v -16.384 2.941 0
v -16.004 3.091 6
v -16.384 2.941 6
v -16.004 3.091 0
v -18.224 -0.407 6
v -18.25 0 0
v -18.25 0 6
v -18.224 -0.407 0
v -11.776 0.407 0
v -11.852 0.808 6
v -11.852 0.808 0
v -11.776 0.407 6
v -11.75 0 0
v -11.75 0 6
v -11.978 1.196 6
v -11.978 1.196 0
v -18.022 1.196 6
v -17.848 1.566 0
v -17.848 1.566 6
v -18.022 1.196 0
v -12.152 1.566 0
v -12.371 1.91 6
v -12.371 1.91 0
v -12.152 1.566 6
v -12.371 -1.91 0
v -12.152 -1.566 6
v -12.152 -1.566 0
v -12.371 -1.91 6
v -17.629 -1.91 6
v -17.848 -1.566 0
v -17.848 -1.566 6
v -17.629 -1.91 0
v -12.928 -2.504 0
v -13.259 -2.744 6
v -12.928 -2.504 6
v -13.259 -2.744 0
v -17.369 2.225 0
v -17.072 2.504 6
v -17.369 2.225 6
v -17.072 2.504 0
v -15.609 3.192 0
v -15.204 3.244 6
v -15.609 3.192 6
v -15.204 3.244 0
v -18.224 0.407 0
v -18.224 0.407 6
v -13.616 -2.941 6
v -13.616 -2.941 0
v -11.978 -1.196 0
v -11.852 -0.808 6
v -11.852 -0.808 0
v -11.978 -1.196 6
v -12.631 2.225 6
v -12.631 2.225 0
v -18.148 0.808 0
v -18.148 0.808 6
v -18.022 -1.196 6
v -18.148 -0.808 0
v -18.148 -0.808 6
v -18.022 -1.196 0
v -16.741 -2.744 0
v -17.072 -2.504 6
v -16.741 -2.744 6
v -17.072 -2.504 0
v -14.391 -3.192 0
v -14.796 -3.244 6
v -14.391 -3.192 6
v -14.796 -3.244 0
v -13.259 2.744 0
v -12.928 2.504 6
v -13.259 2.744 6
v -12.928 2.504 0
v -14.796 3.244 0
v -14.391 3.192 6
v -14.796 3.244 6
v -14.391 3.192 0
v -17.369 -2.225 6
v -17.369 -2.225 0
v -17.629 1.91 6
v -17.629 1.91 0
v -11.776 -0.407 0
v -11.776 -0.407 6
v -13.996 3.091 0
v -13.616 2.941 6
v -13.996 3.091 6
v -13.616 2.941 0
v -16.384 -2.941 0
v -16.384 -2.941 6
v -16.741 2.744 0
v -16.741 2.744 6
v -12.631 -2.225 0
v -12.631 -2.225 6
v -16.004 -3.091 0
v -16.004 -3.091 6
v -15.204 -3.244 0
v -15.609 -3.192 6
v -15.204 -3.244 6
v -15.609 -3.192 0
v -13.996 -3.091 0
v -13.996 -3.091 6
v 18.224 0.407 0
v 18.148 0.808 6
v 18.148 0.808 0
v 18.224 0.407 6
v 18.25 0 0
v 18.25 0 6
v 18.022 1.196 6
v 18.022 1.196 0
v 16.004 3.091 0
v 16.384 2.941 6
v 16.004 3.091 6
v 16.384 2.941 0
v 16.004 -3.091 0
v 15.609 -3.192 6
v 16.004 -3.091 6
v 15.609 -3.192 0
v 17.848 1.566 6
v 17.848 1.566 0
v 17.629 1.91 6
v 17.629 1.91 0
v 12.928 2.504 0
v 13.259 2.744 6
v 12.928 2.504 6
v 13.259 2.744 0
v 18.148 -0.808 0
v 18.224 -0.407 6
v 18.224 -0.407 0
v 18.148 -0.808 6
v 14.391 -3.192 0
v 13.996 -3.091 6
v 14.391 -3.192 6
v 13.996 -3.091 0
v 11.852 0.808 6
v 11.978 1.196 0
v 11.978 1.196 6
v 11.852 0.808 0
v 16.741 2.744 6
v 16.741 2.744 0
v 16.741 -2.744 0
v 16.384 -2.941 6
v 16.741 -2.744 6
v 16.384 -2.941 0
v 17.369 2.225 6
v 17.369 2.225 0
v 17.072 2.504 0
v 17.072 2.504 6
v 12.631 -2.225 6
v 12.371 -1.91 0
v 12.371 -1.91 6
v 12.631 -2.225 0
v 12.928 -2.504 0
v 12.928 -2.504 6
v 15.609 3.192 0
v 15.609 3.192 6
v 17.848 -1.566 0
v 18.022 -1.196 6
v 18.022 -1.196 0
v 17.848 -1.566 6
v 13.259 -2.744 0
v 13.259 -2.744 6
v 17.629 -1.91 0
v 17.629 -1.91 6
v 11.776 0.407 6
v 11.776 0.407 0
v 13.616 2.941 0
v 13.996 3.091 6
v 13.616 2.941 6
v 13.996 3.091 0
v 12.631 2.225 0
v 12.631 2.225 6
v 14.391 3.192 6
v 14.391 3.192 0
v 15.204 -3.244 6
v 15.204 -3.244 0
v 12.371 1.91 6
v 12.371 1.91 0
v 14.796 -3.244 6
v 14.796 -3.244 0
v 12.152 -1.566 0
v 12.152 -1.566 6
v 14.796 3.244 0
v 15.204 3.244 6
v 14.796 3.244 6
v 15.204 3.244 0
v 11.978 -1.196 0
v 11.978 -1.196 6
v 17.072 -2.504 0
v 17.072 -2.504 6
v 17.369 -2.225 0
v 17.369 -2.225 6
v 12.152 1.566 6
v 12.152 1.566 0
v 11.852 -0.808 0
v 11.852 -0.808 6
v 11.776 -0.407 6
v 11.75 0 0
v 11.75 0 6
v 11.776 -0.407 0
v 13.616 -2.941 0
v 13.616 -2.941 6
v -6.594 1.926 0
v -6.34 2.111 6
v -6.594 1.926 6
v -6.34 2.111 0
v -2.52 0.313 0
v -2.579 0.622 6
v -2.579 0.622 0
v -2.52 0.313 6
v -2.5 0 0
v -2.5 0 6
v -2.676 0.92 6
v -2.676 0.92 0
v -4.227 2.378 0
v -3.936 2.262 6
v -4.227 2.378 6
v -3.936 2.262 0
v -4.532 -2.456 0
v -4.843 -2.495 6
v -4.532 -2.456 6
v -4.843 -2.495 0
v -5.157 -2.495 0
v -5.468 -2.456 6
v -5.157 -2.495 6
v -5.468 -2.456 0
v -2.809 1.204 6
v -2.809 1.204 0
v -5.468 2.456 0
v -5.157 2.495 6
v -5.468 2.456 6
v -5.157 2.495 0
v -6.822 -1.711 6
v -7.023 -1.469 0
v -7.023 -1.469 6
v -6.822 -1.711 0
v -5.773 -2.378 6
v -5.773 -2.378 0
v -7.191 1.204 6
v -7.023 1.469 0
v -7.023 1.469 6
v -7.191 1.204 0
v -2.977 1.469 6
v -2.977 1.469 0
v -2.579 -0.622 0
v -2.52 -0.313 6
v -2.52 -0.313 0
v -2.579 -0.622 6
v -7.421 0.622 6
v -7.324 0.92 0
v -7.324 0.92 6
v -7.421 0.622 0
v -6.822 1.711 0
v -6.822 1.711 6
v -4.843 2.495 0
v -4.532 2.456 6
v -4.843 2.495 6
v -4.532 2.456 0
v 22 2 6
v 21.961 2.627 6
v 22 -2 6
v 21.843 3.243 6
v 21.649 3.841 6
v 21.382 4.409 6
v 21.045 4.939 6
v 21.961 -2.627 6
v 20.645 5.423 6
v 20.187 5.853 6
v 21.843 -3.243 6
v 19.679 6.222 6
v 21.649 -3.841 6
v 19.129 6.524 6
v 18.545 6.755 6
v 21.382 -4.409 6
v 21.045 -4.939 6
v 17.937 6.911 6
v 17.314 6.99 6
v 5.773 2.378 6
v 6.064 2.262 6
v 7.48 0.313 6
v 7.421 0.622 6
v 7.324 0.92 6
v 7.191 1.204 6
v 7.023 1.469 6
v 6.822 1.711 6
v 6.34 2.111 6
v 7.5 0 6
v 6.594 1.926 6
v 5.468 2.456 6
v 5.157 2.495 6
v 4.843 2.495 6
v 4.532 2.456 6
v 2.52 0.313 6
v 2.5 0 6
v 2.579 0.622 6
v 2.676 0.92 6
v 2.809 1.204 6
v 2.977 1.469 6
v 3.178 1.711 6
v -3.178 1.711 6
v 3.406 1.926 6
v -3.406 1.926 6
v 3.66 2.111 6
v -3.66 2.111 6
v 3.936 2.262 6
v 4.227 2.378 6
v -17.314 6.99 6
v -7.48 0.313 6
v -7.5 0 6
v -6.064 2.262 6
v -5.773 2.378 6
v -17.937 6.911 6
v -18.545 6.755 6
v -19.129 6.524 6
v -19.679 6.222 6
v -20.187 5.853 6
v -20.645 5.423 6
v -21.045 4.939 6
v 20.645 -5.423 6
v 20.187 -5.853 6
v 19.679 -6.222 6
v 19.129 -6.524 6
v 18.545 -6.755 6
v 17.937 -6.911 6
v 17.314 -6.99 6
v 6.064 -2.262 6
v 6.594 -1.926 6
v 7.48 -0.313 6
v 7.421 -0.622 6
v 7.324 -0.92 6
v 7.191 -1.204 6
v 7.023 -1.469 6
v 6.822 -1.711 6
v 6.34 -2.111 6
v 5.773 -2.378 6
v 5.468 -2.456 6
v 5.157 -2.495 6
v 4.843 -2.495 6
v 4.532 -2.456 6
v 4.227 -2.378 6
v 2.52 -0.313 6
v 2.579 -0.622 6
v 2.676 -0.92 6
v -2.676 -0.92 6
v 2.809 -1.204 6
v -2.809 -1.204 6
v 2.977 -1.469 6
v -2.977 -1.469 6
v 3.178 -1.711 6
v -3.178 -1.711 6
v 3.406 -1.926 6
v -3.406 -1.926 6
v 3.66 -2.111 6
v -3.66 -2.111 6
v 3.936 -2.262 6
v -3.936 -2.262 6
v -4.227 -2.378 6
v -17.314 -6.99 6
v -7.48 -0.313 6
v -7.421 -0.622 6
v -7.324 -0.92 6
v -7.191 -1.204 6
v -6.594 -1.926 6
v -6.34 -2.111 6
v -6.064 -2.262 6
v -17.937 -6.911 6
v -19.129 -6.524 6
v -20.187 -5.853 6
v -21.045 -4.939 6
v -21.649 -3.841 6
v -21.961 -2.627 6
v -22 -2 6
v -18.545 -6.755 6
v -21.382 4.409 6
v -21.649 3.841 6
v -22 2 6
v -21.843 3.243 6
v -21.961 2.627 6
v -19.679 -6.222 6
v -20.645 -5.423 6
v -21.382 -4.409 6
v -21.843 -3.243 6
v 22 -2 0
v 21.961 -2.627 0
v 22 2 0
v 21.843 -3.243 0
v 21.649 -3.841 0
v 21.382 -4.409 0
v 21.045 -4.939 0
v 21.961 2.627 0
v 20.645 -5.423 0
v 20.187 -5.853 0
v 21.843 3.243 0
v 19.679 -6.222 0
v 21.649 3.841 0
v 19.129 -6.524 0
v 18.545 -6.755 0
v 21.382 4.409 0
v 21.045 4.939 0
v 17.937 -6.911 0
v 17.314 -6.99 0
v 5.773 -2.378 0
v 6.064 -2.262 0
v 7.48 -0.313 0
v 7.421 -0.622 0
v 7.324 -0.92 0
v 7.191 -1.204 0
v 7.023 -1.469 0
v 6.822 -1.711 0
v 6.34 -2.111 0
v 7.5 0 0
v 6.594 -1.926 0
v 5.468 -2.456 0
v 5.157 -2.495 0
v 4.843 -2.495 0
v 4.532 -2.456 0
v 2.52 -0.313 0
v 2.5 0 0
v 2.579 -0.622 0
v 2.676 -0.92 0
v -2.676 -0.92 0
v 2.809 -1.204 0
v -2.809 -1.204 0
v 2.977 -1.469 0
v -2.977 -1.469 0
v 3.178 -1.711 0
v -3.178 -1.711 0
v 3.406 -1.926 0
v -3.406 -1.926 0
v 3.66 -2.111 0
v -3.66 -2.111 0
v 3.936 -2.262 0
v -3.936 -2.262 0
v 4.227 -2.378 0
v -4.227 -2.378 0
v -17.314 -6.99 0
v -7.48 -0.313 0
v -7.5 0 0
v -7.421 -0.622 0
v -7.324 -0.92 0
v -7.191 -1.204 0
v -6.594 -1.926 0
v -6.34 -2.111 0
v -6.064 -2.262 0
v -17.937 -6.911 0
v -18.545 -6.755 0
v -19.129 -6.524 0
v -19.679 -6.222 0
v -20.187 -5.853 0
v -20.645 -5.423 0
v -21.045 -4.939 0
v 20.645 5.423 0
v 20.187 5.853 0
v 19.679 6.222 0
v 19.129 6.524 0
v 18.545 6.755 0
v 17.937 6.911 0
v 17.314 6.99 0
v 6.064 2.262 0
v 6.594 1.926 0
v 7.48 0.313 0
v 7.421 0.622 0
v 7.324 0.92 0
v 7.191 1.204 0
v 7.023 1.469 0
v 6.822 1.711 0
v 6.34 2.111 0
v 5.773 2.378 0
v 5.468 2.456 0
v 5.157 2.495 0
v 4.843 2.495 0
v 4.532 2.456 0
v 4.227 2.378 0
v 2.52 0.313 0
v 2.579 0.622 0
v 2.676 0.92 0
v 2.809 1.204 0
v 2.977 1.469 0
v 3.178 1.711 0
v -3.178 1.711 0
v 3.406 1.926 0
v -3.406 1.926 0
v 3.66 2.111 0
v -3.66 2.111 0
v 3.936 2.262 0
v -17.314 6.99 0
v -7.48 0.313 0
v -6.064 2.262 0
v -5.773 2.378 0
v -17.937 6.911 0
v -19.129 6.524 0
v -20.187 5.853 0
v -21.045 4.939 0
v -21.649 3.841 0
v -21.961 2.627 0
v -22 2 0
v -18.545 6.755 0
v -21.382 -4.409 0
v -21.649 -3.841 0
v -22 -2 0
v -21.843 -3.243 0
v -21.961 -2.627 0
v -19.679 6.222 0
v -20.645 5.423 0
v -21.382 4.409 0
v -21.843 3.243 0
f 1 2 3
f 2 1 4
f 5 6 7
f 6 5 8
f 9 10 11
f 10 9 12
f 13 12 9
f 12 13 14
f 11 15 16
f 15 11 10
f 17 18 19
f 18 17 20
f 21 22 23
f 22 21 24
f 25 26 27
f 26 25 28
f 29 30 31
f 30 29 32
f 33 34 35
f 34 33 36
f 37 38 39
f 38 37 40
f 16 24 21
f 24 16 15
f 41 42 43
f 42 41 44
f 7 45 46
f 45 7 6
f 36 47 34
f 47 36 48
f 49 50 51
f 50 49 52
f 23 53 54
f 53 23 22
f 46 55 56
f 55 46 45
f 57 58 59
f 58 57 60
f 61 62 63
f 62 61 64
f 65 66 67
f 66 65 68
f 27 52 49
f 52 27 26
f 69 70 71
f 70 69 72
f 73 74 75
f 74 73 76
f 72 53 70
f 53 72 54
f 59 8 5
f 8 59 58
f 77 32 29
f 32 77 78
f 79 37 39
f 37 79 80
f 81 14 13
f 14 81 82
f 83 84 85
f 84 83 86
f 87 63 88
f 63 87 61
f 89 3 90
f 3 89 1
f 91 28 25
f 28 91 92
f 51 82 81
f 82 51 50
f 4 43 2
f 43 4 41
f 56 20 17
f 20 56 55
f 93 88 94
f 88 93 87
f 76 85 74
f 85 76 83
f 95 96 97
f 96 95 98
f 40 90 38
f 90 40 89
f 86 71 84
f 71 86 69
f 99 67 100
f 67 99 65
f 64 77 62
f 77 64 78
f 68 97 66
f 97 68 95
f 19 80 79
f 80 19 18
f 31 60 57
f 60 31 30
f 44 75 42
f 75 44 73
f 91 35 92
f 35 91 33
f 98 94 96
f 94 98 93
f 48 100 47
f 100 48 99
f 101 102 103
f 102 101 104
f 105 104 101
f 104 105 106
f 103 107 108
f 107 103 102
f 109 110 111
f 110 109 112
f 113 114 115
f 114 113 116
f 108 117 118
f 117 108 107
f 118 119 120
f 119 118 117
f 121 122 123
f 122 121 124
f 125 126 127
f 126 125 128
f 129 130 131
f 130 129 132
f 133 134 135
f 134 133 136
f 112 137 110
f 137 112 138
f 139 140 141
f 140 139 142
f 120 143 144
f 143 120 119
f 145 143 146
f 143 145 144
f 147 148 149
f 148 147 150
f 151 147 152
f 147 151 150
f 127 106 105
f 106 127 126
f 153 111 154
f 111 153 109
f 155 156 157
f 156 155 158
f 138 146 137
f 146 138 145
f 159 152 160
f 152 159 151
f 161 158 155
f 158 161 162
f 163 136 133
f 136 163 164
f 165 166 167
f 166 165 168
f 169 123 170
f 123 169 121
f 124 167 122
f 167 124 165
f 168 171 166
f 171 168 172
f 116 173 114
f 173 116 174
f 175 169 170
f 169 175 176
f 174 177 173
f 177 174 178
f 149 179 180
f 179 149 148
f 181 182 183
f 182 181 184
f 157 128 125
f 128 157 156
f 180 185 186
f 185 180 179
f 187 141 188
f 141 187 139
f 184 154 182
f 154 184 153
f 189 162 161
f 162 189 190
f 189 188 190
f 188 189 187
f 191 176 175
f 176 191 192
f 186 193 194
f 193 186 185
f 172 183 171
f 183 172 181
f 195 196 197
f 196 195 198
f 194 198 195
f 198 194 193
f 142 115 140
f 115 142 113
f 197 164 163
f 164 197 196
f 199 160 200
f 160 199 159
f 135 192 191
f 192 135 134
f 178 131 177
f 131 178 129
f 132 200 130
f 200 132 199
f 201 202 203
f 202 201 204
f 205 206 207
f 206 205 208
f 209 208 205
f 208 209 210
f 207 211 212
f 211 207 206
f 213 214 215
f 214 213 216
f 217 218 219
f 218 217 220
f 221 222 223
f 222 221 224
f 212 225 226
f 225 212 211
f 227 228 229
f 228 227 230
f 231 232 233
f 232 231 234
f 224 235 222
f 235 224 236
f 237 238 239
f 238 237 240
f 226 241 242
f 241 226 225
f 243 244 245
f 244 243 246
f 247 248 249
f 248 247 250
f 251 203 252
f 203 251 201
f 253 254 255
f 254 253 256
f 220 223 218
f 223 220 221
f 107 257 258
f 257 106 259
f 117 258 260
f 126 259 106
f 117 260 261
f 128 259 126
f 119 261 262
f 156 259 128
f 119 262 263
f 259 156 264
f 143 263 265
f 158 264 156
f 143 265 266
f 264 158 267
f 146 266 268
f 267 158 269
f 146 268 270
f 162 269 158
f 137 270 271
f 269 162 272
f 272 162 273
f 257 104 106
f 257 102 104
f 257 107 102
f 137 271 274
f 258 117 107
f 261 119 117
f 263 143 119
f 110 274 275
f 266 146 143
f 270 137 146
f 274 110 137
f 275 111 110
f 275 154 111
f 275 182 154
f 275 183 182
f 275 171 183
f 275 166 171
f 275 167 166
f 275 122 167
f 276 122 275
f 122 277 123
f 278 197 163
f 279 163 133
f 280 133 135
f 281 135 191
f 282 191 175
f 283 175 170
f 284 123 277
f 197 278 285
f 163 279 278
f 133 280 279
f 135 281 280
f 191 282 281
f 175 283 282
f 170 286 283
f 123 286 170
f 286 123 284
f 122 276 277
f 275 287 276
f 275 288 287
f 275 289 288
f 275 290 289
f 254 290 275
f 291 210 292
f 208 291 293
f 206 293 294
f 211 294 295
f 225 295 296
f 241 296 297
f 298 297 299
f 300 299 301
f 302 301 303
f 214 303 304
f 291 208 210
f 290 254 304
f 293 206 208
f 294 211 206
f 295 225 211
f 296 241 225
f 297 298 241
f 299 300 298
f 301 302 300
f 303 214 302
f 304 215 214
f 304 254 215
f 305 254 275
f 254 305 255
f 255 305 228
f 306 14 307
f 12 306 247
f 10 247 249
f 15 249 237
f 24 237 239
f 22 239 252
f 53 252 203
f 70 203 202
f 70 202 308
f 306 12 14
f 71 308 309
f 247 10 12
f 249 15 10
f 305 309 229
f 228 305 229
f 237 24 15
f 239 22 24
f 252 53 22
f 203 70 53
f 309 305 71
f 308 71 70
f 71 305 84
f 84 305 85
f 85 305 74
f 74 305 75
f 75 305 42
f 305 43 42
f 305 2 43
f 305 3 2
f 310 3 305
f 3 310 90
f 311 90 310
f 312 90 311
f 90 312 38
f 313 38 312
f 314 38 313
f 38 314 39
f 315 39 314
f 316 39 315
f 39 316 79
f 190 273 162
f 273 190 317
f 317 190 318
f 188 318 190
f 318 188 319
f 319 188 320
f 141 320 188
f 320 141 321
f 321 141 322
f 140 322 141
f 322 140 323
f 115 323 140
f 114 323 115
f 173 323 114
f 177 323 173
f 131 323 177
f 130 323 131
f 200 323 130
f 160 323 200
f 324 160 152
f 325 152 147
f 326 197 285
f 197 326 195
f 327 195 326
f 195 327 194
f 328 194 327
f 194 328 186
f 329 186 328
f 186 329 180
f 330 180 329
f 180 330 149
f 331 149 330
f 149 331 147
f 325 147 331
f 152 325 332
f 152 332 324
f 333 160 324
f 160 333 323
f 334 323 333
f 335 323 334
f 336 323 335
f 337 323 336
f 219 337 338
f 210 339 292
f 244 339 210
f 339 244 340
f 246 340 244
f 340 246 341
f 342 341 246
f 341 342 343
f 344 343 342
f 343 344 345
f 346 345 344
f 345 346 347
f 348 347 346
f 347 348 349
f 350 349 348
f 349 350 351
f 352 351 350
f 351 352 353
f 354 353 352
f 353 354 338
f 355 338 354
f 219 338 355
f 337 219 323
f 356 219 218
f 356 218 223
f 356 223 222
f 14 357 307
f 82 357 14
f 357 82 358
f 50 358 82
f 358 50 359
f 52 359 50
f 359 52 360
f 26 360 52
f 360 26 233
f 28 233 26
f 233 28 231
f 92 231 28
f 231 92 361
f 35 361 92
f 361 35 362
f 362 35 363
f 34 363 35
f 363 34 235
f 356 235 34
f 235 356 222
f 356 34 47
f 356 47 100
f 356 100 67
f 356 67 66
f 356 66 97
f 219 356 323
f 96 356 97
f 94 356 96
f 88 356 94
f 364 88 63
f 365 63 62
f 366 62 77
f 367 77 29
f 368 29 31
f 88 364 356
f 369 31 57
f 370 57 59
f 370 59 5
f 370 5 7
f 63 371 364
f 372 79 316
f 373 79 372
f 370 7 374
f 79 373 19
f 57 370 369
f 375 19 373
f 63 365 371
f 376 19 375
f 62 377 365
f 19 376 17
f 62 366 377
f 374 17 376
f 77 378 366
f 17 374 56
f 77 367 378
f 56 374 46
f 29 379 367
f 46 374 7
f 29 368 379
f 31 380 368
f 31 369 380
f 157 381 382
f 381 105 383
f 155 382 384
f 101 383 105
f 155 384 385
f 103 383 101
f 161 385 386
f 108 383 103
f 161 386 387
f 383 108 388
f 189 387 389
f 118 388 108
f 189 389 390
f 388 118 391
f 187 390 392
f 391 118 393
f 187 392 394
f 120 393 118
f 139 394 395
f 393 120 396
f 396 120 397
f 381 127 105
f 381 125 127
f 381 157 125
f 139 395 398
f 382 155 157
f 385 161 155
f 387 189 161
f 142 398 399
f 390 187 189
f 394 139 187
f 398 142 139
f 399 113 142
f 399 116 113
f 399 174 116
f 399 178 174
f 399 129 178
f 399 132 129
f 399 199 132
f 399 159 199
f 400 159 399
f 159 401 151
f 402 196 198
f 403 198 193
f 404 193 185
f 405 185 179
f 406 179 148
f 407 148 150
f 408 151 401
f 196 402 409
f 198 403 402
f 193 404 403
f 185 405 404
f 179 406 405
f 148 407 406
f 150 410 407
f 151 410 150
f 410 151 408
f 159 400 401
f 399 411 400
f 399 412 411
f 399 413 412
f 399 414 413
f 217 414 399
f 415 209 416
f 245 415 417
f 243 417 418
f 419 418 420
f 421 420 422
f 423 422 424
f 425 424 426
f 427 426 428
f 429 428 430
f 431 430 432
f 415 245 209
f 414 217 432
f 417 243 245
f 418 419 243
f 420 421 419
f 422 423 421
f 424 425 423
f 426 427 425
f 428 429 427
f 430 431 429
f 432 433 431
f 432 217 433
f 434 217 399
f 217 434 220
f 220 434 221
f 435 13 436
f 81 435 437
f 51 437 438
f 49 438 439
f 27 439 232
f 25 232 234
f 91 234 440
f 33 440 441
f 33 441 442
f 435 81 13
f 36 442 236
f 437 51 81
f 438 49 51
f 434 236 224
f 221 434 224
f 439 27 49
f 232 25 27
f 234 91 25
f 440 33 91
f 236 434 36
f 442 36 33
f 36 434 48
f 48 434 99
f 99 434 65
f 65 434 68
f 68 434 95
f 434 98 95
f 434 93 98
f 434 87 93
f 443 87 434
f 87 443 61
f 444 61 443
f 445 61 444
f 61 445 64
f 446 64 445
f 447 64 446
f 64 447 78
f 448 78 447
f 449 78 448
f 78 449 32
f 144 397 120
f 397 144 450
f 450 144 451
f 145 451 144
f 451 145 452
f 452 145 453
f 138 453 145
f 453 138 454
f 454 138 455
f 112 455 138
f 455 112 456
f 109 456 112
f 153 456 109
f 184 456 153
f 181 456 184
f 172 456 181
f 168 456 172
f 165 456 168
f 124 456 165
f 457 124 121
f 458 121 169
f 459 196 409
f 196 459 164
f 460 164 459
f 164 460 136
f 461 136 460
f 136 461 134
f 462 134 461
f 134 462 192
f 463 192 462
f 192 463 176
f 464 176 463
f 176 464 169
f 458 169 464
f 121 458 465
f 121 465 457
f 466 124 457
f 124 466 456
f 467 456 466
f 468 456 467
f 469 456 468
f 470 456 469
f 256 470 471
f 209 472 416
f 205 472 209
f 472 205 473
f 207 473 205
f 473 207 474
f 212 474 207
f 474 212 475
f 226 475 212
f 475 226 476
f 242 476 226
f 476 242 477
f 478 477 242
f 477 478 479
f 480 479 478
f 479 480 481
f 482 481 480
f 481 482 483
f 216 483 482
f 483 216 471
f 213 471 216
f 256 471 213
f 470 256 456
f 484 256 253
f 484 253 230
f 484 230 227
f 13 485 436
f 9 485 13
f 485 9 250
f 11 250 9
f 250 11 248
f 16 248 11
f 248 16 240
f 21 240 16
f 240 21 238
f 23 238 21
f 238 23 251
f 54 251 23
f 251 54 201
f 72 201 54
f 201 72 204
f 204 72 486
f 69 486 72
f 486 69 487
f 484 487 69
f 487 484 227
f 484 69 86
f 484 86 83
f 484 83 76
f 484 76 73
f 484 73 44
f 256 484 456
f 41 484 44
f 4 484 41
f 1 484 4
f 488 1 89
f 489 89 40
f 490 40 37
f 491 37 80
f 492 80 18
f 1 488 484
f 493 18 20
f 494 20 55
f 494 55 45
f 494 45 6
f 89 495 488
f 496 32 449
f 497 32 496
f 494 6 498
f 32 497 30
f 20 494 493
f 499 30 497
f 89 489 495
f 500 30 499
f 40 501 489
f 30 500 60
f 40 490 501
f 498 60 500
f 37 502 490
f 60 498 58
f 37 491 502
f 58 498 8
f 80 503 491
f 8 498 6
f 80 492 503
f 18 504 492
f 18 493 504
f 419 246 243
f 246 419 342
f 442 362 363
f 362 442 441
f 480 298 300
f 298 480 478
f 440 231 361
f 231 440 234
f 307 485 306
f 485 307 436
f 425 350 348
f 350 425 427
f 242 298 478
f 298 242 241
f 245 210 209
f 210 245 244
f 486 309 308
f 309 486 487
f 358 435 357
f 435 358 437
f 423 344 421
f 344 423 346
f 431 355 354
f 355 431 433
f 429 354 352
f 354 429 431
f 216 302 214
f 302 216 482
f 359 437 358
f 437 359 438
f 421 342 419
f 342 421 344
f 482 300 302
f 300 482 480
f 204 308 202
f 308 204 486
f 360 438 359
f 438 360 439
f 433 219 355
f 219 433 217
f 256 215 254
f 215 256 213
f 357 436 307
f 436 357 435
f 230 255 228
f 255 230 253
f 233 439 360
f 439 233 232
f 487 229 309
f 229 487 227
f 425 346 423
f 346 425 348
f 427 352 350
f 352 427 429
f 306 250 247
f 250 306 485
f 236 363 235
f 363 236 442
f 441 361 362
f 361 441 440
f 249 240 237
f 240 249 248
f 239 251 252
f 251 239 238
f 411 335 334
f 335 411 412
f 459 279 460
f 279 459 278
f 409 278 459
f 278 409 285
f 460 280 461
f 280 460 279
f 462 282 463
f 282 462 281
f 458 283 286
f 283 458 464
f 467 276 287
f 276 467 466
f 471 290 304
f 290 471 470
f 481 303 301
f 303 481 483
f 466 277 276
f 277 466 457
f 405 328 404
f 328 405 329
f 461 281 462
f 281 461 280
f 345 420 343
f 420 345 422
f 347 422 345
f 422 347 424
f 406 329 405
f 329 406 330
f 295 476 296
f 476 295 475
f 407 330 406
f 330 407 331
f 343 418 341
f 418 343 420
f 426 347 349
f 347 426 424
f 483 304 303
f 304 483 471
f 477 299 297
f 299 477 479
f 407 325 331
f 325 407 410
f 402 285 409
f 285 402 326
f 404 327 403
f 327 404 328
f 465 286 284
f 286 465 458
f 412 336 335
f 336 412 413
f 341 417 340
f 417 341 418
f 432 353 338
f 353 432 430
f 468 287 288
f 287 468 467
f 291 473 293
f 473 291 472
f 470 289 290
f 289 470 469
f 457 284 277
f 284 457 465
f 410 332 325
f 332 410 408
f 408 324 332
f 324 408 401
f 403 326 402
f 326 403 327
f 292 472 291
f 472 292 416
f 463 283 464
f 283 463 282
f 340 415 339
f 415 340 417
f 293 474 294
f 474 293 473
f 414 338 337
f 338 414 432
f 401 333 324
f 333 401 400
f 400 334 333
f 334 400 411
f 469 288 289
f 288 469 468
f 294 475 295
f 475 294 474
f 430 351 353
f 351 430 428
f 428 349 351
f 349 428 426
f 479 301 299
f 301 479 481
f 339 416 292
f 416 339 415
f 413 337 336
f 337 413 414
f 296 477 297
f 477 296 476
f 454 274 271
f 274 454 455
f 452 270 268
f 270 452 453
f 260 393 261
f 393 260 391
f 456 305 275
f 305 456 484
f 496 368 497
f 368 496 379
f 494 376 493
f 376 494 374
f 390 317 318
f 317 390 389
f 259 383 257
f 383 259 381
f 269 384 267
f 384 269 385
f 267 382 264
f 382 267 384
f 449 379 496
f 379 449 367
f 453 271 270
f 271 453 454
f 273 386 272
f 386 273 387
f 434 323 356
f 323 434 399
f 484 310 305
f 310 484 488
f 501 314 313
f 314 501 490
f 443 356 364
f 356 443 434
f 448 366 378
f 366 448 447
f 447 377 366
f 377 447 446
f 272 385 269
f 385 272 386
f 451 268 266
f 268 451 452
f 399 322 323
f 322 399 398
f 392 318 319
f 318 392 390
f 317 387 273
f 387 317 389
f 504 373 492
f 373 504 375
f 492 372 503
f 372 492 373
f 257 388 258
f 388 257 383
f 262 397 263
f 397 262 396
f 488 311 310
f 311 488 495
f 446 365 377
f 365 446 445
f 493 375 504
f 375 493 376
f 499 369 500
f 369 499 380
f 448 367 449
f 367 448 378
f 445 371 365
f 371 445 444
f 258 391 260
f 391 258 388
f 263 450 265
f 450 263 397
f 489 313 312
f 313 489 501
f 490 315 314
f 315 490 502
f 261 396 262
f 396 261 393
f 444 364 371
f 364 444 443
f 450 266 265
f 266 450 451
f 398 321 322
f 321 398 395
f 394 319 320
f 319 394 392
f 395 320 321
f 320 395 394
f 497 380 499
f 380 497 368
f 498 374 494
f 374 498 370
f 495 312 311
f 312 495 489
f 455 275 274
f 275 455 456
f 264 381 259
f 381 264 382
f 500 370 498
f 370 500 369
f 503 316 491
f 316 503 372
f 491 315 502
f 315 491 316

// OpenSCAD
$fn = 50;


difference() {
	union() {
		hull() {
			translate(v = [-17.0000000000, 2.0000000000, 0]) {
				cylinder(h = 6, r = 5);
			}
			translate(v = [17.0000000000, 2.0000000000, 0]) {
				cylinder(h = 6, r = 5);
			}
			translate(v = [-17.0000000000, -2.0000000000, 0]) {
				cylinder(h = 6, r = 5);
			}
			translate(v = [17.0000000000, -2.0000000000, 0]) {
				cylinder(h = 6, r = 5);
			}
		}
	}
	union() {
		#translate(v = [-15.0000000000, 0.0000000000, 0]) {
			cylinder(h = 6, r = 3.2500000000);
		}
		#translate(v = [15.0000000000, 0.0000000000, 0]) {
			cylinder(h = 6, r = 3.2500000000);
		}
		#translate(v = [-15.0000000000, 0.0000000000, -100.0000000000]) {
			cylinder(h = 200, r = 3.2500000000);
		}
		#translate(v = [-15.0000000000, 0.0000000000, -100.0000000000]) {
			cylinder(h = 200, r = 3.2500000000);
		}
		#translate(v = [15.0000000000, 0.0000000000, -100.0000000000]) {
			cylinder(h = 200, r = 3.2500000000);
		}
		#translate(v = [15.0000000000, 0.0000000000, -100.0000000000]) {
			cylinder(h = 200, r = 3.2500000000);
		}
		#translate(v = [-15.0000000000, 0.0000000000, 0]) {
			cylinder(h = 6, r = 1.8000000000);
		}
		#translate(v = [15.0000000000, 0.0000000000, 0]) {
			cylinder(h = 6, r = 1.8000000000);
		}
		#translate(v = [-15.0000000000, 0.0000000000, 0]) {
			cylinder(h = 6, r = 1.8000000000);
		}
		#translate(v = [15.0000000000, 0.0000000000, 0]) {
			cylinder(h = 6, r = 1.8000000000);
		}
		#translate(v = [-15.0000000000, 0.0000000000, 0]) {
			cylinder(h = 6, r = 1.8000000000);
		}
		#translate(v = [15.0000000000, 0.0000000000, 0]) {
			cylinder(h = 6, r = 1.8000000000);
		}
		#translate(v = [-5.0000000000, 0, 0]) {
			cylinder(h = 6, r = 2.5000000000);
		}
		#translate(v = [5.0000000000, 0, 0]) {
			cylinder(h = 6, r = 2.5000000000);
		}
	}
}
